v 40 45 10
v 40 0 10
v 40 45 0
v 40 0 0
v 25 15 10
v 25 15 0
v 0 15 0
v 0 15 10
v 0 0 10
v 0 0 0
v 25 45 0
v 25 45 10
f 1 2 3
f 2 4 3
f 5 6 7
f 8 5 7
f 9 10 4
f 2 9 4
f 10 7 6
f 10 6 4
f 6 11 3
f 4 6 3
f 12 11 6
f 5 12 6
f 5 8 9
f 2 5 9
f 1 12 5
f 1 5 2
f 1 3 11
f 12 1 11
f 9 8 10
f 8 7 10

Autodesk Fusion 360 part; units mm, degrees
sketch "Sketch1" plane through (0, 0, 0) normal (0, 0, 1) x (1, 0, 0)
  line L0 (0, 0) -> (35, 0)
  line L1 (35, 0) -> (35, 15)
  line L2 (35, 15) -> (0, 15)
  line L3 (0, 15) -> (0, 0)
  line L4 (25, 0) -> (40, 0)
  line L5 (40, 0) -> (40, 45)
  line L6 (40, 45) -> (25, 45)
  line L7 (25, 45) -> (25, 0)
extrude "Extrude1" add sketch "Sketch1" along normal blind 10
sketch "Sketch2" plane through (0, 0, 0) normal (0, 1, 0) x (1, 0, 0)
